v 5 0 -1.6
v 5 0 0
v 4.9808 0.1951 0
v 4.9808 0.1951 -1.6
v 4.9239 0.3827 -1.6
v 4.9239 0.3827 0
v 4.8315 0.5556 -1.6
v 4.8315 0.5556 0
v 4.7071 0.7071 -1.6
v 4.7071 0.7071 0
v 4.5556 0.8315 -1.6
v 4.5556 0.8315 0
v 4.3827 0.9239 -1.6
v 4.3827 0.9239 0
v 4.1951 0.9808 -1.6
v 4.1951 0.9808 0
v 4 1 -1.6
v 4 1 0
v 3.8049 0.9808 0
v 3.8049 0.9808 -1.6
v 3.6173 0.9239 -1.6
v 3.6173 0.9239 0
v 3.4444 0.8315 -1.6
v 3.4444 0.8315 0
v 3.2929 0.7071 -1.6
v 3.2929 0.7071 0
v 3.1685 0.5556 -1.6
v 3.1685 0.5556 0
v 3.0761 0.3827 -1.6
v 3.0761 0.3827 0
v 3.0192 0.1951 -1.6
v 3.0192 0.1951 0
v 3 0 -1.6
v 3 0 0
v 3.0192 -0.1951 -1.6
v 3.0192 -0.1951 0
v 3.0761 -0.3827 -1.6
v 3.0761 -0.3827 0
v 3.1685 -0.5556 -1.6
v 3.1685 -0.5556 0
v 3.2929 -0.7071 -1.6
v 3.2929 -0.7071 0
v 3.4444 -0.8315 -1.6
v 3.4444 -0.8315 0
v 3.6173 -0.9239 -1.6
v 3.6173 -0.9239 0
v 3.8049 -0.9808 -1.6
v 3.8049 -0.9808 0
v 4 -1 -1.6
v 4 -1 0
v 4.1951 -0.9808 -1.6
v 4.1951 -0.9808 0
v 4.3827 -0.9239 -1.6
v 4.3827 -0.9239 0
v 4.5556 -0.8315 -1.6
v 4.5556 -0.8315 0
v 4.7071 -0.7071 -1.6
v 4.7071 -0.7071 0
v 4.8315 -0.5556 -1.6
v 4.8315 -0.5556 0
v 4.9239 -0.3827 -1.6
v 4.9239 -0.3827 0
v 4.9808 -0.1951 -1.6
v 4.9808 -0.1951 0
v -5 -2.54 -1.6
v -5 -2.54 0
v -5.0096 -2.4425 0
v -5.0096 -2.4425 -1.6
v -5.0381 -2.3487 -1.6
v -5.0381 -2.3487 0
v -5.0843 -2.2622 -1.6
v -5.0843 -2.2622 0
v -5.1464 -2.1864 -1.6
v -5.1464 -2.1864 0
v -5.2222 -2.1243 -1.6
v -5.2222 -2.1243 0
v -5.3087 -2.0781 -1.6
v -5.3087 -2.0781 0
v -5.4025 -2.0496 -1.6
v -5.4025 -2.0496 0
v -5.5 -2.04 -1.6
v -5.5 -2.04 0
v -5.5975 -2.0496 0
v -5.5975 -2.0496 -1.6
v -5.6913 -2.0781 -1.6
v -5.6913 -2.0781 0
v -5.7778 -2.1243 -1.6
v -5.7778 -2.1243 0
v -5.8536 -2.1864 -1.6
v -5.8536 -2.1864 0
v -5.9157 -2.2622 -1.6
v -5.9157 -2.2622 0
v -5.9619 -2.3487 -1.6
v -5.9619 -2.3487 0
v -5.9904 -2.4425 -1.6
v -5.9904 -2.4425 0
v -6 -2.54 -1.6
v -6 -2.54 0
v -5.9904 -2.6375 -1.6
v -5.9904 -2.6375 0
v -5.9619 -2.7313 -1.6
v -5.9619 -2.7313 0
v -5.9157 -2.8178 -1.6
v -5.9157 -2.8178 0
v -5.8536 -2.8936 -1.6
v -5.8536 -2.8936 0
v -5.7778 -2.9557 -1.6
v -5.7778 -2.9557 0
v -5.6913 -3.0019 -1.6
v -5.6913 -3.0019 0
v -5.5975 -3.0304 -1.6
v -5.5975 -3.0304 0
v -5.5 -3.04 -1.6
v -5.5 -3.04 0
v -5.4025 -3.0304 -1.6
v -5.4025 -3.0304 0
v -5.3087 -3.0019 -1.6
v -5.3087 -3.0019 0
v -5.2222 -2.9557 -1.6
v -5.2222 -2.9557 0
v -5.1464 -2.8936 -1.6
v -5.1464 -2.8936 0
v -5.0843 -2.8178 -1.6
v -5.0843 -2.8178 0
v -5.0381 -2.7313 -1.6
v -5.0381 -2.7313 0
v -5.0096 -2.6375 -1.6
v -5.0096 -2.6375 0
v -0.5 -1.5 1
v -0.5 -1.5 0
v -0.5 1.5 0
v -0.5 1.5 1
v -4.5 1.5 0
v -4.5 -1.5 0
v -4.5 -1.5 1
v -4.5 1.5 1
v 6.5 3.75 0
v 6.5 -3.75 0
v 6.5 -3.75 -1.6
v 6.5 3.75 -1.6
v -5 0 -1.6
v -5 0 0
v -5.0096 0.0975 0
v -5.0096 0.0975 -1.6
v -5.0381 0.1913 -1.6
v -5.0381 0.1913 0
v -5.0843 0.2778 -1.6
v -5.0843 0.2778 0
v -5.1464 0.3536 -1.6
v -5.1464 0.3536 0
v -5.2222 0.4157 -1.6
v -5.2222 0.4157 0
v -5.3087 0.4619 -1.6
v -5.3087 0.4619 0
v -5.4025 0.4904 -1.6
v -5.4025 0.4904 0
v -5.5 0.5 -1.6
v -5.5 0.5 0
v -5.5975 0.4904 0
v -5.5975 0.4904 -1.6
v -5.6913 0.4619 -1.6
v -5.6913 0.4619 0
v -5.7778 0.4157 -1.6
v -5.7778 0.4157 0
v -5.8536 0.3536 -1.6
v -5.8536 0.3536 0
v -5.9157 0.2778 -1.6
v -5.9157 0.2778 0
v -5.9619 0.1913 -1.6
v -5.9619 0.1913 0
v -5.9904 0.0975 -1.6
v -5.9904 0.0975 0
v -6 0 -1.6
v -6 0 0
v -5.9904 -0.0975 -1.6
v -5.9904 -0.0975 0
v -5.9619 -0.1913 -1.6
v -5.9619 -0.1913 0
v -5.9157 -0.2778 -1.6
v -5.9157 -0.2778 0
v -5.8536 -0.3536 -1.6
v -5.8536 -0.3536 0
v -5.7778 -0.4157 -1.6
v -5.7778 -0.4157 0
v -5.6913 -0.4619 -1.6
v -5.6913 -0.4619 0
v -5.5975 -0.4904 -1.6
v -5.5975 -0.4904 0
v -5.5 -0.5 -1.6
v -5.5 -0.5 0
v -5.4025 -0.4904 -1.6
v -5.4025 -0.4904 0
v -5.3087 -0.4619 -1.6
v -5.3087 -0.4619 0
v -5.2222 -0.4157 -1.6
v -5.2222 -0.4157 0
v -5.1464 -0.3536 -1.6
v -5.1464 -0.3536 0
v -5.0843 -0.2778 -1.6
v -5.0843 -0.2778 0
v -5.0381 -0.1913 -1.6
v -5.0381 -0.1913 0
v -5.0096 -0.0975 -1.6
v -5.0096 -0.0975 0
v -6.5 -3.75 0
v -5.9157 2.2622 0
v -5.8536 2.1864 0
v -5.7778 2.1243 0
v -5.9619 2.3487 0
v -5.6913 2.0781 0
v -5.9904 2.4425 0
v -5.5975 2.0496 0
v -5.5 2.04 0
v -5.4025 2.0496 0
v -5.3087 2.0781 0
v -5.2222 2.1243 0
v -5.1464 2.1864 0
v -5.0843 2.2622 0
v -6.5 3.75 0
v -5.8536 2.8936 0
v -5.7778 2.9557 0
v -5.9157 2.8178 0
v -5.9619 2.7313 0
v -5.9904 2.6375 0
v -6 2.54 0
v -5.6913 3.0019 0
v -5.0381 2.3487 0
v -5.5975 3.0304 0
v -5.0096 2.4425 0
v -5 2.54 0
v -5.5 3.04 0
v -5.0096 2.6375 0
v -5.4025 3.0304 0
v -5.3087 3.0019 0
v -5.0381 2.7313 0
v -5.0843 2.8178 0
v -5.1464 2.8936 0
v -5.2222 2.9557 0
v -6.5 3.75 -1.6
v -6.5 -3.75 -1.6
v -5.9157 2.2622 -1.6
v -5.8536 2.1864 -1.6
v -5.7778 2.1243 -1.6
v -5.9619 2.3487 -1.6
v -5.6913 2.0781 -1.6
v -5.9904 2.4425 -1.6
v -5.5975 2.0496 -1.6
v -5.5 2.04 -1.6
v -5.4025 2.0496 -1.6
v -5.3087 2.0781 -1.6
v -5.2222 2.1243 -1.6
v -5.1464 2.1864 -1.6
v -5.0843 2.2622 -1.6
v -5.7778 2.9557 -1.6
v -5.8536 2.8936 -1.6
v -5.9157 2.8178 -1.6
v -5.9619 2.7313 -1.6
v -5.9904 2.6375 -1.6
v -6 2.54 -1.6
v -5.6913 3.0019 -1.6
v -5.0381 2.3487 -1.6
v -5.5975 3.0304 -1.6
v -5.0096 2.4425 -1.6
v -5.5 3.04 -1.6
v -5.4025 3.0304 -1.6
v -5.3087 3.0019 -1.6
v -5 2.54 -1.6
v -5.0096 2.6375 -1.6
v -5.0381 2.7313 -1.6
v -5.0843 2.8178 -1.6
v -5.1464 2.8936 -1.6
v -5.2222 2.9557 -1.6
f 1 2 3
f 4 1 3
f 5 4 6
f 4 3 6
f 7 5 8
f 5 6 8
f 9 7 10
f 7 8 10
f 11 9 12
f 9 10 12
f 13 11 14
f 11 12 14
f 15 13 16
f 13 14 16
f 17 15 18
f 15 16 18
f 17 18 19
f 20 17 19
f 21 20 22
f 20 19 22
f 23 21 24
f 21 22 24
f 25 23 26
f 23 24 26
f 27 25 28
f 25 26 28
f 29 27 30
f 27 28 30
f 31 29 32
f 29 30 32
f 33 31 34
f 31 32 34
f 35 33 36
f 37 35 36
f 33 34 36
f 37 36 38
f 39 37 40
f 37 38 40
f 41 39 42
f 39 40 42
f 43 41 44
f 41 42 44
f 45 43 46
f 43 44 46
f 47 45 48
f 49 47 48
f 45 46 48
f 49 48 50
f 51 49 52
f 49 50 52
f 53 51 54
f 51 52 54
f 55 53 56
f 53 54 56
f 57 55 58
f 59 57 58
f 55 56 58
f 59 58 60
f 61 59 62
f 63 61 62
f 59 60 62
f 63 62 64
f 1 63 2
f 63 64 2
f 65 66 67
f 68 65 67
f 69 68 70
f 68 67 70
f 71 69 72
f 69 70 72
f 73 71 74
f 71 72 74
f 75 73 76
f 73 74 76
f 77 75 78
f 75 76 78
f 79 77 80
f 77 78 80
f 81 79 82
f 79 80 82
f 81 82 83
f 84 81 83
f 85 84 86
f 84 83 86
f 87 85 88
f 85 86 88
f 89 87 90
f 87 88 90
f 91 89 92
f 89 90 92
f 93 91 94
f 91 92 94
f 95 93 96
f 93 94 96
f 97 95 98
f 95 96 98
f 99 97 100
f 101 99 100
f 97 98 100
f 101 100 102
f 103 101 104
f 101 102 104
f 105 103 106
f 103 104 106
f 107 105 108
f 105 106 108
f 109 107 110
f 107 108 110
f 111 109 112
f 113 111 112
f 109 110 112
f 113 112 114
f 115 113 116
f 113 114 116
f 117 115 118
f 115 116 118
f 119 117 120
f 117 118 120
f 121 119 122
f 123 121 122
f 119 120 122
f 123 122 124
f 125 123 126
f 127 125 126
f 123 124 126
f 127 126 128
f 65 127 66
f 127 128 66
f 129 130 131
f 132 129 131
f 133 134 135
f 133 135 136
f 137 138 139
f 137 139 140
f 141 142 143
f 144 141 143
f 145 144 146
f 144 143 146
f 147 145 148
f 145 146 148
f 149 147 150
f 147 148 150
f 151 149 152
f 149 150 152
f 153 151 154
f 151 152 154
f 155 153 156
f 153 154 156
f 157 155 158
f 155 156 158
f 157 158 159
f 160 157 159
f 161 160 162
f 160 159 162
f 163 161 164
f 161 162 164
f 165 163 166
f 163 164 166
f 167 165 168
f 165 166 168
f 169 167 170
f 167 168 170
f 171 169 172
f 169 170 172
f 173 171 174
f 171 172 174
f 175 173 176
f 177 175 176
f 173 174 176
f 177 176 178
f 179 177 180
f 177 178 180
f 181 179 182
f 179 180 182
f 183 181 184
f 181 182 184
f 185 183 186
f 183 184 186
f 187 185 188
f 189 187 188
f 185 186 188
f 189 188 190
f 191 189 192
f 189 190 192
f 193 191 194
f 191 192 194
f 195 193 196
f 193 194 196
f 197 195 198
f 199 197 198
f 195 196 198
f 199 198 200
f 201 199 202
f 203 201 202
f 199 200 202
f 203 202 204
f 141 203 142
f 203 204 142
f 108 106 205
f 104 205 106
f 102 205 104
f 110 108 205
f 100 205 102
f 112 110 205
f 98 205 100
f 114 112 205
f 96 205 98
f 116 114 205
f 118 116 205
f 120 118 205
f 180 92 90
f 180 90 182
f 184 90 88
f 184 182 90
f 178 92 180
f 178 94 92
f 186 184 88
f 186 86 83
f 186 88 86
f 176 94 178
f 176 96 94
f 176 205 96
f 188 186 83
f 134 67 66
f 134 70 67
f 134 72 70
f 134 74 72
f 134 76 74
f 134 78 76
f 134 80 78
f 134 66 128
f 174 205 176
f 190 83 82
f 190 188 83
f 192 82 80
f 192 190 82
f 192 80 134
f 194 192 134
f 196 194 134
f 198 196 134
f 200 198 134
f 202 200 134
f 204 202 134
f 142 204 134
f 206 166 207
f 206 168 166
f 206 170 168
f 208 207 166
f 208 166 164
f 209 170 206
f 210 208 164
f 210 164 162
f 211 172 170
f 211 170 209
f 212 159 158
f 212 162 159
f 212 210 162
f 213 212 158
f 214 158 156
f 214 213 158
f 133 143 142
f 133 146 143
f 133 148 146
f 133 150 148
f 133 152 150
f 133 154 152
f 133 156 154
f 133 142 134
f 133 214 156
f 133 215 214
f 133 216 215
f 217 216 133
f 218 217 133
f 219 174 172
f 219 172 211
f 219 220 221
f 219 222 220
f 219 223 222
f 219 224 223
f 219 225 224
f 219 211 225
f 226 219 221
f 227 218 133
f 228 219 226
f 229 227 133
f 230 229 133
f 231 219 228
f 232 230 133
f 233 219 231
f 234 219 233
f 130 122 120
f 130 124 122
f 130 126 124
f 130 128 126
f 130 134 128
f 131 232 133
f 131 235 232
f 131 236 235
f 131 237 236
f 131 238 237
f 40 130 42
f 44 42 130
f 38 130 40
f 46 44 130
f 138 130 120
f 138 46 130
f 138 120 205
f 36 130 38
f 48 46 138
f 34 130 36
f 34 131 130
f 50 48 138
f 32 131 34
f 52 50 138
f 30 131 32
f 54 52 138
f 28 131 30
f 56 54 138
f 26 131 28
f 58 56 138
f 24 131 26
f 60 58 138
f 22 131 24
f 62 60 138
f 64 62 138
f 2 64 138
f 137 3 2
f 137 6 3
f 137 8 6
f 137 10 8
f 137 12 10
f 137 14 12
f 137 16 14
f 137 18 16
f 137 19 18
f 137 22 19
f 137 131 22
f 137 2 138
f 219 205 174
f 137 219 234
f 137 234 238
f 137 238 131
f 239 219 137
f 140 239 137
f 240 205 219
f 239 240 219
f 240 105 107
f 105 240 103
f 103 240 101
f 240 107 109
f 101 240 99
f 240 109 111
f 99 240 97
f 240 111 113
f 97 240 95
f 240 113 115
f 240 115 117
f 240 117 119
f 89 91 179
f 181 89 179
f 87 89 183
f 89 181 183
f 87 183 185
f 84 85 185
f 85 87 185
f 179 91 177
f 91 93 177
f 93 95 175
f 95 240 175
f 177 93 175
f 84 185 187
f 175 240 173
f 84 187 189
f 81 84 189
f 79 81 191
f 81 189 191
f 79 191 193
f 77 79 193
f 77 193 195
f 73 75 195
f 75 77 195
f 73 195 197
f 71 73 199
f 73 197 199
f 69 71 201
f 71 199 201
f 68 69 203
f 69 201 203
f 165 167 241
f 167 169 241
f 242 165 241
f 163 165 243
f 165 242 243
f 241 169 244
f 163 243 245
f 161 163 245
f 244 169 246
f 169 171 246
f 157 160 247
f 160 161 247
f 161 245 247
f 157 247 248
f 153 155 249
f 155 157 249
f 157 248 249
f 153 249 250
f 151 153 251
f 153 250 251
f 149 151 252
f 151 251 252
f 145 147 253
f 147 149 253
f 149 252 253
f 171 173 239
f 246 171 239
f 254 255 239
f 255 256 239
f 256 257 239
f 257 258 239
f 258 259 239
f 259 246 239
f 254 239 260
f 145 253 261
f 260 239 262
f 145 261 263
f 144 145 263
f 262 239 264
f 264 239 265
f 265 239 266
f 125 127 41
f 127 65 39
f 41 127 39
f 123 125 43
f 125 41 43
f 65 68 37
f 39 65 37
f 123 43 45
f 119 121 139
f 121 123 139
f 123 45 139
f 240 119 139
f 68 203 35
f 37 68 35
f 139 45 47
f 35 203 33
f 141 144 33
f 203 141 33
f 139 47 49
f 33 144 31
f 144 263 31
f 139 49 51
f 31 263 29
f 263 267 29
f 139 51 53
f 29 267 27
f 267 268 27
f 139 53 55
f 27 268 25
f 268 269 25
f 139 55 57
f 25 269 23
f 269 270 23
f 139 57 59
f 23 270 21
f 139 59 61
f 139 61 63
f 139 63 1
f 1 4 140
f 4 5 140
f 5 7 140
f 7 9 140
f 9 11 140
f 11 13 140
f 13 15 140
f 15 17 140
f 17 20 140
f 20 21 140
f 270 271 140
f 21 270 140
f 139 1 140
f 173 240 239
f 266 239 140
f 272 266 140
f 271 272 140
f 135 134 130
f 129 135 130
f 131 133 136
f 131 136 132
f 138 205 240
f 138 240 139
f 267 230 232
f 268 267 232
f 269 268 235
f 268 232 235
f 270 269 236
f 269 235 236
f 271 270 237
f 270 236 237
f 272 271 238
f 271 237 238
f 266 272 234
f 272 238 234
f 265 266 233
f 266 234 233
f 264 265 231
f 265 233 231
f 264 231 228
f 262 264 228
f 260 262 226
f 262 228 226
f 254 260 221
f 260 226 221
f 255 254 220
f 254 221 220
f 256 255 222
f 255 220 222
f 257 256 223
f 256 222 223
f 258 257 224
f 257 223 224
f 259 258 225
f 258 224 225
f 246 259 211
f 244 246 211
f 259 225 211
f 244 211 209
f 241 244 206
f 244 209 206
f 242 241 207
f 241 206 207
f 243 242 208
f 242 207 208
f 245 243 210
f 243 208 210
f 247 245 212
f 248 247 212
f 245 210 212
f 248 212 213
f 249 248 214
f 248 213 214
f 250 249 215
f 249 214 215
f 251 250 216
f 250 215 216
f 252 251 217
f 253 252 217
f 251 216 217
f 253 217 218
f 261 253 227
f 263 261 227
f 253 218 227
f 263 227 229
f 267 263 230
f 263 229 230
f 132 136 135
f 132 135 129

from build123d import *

# Parameters (mm, degrees)
F0_W     = 13
F0_H     = 7.5
F0_R     = 0.5
F0_W_2   = 4
F0_H_2   = 3
F0_R_2   = 1
F1_DEPTH = 1.6
F2_DEPTH = 1


with BuildPart() as f1:
    # F0 (on Top) → F1 (new body)
    with BuildSketch(Plane.XY):
        Rectangle(F0_W, F0_H)
        with Locations((-5.5, -2.54)):
            Circle(F0_R, mode=Mode.SUBTRACT)
        with Locations((-5.5, 0)):
            Circle(F0_R, mode=Mode.SUBTRACT)
        with Locations((-2.5, 0)):
            Rectangle(F0_W_2, F0_H_2, mode=Mode.SUBTRACT)
        with Locations((-5.5, 2.54)):
            Circle(F0_R, mode=Mode.SUBTRACT)
        with Locations((4, 0)):
            Circle(F0_R_2, mode=Mode.SUBTRACT)
        with Locations((-2.5, 0)):
            Rectangle(F0_W_2, F0_H_2)
    extrude(amount=-F1_DEPTH)

    # F0 (on Top) → F2 (join)
    with BuildSketch(Plane.XY):
        with Locations((-2.5, 0)):
            Rectangle(F0_W_2, F0_H_2)
    extrude(amount=F2_DEPTH)


solid = f1.part
